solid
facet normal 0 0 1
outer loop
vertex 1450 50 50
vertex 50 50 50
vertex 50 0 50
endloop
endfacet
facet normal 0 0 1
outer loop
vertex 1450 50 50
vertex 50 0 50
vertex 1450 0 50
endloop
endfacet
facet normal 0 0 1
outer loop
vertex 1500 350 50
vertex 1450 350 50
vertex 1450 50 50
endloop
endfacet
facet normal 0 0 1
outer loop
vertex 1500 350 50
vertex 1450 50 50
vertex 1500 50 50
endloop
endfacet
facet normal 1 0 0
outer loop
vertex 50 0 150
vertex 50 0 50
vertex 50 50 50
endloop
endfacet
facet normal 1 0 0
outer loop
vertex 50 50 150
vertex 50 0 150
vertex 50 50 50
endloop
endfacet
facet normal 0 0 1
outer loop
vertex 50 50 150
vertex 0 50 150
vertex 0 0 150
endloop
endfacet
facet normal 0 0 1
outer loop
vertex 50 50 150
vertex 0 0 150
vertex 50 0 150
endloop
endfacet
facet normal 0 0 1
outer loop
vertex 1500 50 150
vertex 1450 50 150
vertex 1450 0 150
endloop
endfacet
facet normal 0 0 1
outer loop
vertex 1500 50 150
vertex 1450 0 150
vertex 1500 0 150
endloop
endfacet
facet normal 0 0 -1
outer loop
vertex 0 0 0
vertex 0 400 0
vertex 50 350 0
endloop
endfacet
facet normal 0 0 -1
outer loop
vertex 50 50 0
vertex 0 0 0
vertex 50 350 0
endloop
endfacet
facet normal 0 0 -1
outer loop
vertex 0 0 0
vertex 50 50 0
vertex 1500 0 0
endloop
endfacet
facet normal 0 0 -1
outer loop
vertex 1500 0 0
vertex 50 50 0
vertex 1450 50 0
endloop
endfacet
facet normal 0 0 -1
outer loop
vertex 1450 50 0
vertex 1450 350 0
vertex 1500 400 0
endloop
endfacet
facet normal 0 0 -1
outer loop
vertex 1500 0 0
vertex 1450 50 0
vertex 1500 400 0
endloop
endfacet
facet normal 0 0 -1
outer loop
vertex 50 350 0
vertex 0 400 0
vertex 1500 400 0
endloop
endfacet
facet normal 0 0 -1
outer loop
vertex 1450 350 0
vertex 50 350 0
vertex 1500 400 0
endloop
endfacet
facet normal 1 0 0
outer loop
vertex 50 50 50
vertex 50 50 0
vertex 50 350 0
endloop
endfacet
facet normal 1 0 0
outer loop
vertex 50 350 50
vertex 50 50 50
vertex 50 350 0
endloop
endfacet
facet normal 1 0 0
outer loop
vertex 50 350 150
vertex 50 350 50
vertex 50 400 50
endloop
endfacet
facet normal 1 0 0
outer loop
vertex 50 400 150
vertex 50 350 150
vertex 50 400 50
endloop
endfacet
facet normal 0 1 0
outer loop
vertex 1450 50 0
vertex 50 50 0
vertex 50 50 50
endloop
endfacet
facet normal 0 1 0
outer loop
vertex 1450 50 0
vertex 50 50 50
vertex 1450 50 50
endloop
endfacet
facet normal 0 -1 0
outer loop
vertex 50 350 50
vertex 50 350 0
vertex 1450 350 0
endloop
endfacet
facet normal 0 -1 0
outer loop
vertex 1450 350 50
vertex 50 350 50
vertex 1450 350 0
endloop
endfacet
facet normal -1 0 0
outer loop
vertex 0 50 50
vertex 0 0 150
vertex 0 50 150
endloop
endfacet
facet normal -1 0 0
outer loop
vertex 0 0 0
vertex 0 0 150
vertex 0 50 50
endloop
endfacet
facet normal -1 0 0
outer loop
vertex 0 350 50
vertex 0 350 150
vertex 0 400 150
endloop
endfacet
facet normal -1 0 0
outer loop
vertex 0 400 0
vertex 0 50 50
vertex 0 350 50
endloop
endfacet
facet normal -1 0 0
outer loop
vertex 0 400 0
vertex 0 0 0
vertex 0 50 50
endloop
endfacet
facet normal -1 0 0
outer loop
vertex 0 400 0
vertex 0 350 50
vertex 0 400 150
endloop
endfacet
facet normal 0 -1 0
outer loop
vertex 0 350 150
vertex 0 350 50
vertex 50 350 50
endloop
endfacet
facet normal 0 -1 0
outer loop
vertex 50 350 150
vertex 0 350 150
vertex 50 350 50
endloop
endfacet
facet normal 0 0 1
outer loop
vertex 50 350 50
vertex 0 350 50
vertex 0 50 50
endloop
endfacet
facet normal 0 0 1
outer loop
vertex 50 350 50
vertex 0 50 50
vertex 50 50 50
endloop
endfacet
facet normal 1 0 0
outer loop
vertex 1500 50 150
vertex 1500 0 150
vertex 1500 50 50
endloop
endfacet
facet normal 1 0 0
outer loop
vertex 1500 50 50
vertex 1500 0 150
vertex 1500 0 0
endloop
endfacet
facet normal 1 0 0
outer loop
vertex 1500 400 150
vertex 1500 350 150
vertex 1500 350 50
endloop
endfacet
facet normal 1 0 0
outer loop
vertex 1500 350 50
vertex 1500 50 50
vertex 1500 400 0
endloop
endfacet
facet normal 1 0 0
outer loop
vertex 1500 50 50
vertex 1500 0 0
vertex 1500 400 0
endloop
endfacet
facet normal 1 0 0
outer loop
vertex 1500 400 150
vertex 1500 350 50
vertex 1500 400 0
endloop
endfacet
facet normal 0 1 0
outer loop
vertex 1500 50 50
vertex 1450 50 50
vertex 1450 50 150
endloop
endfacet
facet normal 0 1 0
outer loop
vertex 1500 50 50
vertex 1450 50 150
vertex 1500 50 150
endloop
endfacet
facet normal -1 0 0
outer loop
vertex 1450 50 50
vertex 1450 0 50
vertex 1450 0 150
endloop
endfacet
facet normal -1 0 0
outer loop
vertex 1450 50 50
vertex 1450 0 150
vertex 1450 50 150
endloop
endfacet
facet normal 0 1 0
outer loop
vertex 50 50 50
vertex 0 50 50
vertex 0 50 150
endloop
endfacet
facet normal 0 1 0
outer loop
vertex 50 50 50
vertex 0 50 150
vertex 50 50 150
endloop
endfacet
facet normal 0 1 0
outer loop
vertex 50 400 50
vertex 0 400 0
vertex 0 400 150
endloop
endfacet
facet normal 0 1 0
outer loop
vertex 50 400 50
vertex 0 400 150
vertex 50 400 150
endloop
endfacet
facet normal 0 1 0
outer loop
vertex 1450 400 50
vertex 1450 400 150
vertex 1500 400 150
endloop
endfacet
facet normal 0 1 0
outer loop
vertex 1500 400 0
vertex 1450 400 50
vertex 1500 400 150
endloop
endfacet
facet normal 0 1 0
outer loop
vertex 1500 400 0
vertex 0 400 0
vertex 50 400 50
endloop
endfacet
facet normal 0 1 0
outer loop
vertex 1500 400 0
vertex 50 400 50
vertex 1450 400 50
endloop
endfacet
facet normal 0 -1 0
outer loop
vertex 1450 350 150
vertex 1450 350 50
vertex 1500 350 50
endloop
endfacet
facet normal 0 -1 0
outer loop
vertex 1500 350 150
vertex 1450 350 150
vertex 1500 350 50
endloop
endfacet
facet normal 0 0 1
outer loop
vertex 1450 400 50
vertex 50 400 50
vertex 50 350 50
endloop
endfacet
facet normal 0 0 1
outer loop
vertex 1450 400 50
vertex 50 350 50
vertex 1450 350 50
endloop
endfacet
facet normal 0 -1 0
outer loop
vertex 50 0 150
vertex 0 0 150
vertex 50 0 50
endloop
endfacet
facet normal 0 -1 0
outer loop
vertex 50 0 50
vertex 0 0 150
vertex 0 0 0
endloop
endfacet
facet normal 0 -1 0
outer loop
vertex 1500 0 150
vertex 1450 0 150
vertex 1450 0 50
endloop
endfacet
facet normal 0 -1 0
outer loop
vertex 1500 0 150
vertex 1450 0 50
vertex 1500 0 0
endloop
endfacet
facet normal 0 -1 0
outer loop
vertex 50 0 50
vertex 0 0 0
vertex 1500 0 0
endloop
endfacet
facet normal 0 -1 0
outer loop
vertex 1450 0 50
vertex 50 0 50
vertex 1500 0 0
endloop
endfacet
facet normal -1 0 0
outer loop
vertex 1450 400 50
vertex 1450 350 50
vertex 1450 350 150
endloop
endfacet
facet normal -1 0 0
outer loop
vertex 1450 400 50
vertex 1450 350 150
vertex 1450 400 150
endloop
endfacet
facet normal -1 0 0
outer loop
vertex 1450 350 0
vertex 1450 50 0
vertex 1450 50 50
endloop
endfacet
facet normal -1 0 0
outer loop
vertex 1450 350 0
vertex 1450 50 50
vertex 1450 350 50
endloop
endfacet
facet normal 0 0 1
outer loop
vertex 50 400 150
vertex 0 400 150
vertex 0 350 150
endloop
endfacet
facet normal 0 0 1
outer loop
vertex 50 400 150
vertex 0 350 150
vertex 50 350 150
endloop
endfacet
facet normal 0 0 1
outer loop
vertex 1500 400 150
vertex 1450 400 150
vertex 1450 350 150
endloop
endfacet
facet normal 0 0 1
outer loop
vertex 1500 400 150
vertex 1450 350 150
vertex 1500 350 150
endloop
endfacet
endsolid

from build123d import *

# Parameters (mm, degrees)
F0_W     = 1500
F0_H     = 400
F0_W_2   = 1400
F0_H_2   = 300
F1_DEPTH = 50
F2_W     = 50
F2_H     = 50
F3_DEPTH = 100


with BuildPart() as f1:
    # F0 (on Top) → F1 (new body)
    with BuildSketch(Plane.XY):
        with Locations((750, 200)):
            Rectangle(F0_W, F0_H)
        with Locations((750, 200)):
            Rectangle(F0_W_2, F0_H_2, mode=Mode.SUBTRACT)
    extrude(amount=F1_DEPTH)

    # F2 (on face) → F3 (join)
    with BuildSketch(Plane.XY.offset(50)):
        with Locations((25, 375)):
            Rectangle(F2_W, F2_H)
        with Locations((25, 25)):
            Rectangle(F2_W, F2_H)
        with Locations((1475, 375)):
            Rectangle(F2_W, F2_H)
        with Locations((1475, 25)):
            Rectangle(F2_W, F2_H)
    extrude(amount=F3_DEPTH)


solid = f1.part
